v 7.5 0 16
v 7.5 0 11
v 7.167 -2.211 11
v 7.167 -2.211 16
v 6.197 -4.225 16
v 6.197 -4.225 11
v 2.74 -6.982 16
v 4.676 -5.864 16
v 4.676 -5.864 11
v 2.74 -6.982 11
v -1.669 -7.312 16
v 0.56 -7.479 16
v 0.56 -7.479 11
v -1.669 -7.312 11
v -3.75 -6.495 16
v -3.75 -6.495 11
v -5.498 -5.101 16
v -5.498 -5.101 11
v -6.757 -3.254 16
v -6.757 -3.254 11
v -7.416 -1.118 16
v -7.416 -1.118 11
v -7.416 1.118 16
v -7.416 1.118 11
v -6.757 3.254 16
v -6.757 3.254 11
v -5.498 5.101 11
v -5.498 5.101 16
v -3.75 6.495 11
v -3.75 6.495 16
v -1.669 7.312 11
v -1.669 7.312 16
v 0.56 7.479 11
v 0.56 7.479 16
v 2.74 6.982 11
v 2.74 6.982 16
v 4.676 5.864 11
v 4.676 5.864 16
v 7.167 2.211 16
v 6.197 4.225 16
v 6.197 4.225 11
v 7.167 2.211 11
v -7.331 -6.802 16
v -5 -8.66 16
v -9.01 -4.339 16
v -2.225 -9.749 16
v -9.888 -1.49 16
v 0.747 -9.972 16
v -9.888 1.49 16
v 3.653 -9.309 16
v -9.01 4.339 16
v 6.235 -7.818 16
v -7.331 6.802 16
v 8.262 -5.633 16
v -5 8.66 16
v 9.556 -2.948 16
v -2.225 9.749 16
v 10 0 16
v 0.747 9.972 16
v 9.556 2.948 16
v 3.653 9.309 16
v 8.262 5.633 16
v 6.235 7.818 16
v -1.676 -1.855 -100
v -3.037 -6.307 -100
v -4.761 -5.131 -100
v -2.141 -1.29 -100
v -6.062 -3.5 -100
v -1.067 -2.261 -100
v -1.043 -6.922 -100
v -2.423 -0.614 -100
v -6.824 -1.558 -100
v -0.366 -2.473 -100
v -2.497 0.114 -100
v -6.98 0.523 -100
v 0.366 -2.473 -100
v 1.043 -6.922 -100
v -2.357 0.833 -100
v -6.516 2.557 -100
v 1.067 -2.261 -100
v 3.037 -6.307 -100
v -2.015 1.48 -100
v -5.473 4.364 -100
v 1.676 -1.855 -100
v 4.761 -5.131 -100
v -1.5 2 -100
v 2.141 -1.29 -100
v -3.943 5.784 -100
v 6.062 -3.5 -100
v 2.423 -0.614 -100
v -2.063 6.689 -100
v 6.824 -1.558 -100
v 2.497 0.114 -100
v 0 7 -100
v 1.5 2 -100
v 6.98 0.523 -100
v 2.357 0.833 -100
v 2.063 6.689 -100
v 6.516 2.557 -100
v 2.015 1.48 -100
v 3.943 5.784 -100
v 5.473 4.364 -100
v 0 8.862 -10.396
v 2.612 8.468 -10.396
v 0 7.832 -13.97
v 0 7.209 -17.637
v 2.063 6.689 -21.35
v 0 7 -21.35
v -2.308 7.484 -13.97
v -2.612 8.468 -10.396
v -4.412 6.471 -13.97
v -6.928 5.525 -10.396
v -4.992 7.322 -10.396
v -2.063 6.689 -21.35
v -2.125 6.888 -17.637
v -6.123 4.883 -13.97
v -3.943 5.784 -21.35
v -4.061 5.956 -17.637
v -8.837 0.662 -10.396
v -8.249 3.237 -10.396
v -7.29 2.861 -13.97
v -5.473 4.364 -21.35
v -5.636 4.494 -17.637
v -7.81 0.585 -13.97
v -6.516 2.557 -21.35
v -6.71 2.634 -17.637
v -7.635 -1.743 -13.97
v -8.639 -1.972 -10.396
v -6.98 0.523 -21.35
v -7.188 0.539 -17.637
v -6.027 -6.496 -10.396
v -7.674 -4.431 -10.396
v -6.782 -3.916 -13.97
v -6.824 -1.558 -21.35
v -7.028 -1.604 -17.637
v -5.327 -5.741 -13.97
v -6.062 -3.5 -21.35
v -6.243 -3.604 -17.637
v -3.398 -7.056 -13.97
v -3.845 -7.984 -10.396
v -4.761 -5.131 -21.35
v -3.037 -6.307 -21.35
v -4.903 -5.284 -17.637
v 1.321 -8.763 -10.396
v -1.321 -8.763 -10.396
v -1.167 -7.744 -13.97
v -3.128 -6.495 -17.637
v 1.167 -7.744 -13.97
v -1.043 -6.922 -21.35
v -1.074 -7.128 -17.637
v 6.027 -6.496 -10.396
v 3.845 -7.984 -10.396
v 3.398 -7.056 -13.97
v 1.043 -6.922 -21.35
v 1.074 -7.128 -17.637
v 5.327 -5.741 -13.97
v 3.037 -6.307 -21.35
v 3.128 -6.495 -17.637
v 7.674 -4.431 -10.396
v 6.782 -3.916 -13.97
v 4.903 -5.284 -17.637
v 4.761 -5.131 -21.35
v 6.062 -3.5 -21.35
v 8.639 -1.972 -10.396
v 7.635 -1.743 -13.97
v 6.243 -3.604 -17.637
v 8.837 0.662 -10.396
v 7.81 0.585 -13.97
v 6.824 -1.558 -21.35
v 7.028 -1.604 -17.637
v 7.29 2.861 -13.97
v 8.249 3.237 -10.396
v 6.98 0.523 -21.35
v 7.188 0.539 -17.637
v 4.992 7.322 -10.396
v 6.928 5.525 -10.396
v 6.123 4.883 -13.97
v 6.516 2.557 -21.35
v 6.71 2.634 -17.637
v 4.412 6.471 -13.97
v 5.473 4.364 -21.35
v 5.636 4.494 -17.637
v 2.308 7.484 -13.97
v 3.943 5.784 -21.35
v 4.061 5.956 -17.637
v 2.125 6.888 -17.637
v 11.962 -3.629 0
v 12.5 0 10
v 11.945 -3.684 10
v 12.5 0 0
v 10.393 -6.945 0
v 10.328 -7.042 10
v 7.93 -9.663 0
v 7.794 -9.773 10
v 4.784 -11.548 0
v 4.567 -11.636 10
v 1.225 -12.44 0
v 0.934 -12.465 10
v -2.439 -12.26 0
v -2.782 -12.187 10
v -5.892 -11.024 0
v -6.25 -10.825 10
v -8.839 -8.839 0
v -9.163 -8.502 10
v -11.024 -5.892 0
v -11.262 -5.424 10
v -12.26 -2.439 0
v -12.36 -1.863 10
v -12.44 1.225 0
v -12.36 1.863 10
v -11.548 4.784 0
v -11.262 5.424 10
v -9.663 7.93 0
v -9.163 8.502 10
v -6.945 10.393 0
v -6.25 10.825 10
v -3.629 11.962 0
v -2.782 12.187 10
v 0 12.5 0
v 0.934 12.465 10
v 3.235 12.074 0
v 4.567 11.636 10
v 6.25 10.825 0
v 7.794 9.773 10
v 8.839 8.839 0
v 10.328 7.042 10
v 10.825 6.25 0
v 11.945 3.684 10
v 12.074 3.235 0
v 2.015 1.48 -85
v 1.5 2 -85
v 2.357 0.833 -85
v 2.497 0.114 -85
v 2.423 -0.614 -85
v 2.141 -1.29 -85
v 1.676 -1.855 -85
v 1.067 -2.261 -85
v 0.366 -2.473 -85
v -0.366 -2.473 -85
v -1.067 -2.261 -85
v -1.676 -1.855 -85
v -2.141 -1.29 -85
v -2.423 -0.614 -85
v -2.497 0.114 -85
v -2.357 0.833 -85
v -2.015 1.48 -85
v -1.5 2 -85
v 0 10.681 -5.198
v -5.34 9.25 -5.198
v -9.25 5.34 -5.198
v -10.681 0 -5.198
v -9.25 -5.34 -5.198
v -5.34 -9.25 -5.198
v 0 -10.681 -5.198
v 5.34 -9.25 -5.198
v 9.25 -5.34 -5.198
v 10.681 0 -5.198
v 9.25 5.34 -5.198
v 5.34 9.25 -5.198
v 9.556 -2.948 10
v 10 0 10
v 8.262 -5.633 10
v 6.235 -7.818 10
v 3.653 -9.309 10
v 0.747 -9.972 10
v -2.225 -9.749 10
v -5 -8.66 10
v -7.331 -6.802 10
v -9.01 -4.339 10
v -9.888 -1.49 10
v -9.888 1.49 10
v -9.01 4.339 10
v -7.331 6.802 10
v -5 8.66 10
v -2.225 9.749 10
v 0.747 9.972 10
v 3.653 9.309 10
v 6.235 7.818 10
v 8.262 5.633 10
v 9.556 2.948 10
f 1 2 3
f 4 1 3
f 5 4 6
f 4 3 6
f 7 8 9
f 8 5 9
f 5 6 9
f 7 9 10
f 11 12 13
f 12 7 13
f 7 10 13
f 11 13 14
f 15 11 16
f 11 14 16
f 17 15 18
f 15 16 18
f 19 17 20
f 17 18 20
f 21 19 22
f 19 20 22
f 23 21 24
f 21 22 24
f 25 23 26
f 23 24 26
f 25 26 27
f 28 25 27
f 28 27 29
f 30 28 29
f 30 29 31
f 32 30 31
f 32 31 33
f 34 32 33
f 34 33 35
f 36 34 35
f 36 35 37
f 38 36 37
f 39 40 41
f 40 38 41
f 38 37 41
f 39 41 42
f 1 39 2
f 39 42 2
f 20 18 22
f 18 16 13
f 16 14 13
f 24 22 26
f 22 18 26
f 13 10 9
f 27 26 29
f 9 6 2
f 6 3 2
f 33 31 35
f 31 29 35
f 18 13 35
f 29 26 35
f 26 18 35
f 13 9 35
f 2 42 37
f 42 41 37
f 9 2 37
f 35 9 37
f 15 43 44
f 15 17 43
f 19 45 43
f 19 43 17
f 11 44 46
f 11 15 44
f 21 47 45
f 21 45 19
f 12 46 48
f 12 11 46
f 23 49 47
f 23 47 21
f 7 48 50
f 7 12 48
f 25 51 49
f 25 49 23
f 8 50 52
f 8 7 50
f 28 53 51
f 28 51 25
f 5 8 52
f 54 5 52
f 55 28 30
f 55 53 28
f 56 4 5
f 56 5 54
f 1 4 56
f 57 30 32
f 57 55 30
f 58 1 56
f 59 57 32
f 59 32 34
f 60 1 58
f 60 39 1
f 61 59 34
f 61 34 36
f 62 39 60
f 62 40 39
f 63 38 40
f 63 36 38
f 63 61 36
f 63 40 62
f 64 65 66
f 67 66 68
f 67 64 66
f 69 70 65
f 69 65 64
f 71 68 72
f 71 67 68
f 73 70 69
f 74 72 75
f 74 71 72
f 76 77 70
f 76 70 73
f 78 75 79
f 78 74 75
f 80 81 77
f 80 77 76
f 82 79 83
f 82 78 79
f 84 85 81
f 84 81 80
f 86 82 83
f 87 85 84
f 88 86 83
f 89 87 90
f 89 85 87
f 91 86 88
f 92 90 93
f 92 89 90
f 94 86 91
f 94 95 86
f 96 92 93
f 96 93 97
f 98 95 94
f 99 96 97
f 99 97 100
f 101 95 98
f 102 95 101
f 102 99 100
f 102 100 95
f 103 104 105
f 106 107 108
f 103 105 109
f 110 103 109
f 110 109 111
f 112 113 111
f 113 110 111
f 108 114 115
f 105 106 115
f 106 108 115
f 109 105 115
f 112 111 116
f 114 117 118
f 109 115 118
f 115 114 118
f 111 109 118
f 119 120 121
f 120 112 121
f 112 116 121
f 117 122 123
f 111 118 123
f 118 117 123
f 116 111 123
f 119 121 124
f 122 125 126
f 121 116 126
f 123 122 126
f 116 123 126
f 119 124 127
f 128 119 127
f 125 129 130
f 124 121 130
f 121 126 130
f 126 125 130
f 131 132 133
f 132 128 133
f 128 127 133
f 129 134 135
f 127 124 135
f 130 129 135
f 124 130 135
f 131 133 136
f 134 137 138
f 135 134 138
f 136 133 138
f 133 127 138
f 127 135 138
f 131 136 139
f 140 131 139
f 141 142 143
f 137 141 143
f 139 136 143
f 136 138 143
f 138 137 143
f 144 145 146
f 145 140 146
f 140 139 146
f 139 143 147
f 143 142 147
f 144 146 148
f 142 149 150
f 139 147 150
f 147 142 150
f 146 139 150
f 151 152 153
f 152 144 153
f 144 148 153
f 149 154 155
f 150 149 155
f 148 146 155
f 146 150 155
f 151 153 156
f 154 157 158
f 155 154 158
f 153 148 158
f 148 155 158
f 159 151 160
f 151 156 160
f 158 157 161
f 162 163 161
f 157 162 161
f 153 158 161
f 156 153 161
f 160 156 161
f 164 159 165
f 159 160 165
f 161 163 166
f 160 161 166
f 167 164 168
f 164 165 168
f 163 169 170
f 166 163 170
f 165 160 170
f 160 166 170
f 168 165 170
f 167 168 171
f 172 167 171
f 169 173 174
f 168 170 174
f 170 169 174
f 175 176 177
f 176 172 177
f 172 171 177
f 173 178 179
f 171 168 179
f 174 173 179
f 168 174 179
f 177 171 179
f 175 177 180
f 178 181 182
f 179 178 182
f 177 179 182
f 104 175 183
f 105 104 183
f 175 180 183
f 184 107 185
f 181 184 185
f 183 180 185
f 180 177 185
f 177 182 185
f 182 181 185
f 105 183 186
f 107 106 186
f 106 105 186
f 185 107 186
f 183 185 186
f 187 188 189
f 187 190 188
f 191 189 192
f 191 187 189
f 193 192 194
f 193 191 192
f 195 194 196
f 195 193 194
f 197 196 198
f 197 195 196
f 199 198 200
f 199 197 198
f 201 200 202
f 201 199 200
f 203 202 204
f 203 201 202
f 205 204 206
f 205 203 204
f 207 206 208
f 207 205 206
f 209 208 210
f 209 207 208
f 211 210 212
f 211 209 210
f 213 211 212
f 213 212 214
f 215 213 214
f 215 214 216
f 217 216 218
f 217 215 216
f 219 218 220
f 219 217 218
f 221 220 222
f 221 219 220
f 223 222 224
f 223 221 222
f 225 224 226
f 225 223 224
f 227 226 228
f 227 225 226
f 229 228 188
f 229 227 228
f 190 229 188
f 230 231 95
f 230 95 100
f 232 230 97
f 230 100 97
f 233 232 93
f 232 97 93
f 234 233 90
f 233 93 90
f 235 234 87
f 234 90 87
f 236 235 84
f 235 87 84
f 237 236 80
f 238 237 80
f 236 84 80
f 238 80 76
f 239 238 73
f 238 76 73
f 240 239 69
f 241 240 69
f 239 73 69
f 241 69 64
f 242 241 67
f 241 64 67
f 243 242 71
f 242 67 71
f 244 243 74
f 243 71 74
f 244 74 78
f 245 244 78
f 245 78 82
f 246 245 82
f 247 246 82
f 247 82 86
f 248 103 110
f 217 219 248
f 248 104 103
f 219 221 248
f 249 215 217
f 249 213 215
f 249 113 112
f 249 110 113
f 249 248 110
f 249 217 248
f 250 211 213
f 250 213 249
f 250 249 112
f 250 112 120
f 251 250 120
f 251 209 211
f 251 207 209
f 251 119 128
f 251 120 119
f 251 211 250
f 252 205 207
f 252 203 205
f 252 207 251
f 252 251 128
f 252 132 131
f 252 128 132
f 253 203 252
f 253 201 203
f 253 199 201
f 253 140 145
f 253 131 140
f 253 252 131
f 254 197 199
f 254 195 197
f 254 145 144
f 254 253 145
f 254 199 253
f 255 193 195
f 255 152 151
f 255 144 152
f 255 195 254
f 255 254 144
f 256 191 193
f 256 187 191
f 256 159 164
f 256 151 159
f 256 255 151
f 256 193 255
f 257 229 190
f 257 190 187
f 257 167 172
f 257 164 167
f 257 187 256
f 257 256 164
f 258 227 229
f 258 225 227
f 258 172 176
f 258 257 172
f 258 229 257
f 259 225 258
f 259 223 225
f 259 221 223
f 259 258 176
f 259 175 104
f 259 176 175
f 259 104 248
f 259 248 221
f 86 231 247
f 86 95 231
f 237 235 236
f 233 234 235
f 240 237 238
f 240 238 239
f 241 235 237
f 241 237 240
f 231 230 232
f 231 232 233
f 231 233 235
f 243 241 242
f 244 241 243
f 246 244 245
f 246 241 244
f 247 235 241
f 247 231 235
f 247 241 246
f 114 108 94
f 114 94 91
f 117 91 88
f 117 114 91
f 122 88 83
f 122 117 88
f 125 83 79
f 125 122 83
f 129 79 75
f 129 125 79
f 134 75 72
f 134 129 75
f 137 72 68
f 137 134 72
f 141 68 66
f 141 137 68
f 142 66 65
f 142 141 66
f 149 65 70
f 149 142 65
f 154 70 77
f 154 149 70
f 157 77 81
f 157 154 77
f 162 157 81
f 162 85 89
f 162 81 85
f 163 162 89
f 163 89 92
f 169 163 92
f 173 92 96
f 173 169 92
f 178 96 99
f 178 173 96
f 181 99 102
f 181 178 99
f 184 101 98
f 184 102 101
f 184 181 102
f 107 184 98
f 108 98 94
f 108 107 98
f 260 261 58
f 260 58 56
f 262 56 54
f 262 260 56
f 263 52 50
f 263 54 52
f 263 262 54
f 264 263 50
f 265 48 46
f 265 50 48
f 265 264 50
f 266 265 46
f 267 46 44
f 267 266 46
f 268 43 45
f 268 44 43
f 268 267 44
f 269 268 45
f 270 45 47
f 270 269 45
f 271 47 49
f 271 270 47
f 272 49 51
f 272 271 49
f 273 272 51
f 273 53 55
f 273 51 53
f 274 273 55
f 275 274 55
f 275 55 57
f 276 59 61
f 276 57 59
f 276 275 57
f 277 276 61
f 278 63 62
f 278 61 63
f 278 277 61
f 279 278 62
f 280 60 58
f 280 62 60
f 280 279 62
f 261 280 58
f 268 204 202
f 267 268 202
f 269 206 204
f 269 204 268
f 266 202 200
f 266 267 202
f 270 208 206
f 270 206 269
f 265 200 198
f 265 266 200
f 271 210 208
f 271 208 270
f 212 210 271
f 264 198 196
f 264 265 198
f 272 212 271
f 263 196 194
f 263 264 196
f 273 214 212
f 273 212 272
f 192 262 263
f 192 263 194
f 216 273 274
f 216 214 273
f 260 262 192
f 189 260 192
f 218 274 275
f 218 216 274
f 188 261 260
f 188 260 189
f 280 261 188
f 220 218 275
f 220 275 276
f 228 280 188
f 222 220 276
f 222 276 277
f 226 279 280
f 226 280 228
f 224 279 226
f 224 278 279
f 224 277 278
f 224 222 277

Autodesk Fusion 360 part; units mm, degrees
sketch "Sketch5" plane through (0, 0, 0) normal (0, 0, 1) x (1, 0, 0)
  circle A0 centre (0, 0) radius 12.5
  circle A1 centre (0, 0) radius 10
  circle A2 centre (0, 0) radius 7.5
  dimension "d32" = 25
  dimension "d33" = 20
  dimension "d34" = 15
extrude "Extrude8" add sketch "Sketch5" along normal blind 10 contours A0
extrude "Extrude9" add sketch "Sketch5" along normal blind 16 contours A1
sketch "Sketch6" plane through (0, 0, 0) normal (1, 0, 0) x (0, 0, -1)
  line L0 (0, 0) -> (100, 0)
  line L1 (100, 0) -> (100, 7)
  line L2 (0, 12.5) -> (0, -12.5)
  line L3 (100, 7) -> (21.3505, 7)
  line L4 (0, 12.5) -> (10.3963, 8.8615)
  arc A0 (10.3963, 8.8615) -> (21.3505, 7) centre (21.3505, 40.1609) ccw
  dimension "d39" = 100
  dimension "d40" = 7
  dimension "d43" = 33.1609
revolve "Revolve2" add sketch "Sketch6" angle 360 about axis through (0, 0, 0) along (0, 0, -1)
sketch "Sketch7" plane through (0, 0, -100) normal (0, 0, -1) x (-1, 0, 0)
  circle A0 centre (0, 0) radius 7
  line L0 (-1.5, 2) -> (1.5, 2)
  arc A1 (-1.5, 2) -> (1.5, 2) centre (0, 0) ccw
  dimension "d1" = 5
extrude "Extrude10" cut sketch "Sketch7" against normal blind 15 contours L0 A1
extrude "Extrude11" add 1 faces at (-1.613, 0.9883, 0) along direction (0, 0, 1) blind 11
